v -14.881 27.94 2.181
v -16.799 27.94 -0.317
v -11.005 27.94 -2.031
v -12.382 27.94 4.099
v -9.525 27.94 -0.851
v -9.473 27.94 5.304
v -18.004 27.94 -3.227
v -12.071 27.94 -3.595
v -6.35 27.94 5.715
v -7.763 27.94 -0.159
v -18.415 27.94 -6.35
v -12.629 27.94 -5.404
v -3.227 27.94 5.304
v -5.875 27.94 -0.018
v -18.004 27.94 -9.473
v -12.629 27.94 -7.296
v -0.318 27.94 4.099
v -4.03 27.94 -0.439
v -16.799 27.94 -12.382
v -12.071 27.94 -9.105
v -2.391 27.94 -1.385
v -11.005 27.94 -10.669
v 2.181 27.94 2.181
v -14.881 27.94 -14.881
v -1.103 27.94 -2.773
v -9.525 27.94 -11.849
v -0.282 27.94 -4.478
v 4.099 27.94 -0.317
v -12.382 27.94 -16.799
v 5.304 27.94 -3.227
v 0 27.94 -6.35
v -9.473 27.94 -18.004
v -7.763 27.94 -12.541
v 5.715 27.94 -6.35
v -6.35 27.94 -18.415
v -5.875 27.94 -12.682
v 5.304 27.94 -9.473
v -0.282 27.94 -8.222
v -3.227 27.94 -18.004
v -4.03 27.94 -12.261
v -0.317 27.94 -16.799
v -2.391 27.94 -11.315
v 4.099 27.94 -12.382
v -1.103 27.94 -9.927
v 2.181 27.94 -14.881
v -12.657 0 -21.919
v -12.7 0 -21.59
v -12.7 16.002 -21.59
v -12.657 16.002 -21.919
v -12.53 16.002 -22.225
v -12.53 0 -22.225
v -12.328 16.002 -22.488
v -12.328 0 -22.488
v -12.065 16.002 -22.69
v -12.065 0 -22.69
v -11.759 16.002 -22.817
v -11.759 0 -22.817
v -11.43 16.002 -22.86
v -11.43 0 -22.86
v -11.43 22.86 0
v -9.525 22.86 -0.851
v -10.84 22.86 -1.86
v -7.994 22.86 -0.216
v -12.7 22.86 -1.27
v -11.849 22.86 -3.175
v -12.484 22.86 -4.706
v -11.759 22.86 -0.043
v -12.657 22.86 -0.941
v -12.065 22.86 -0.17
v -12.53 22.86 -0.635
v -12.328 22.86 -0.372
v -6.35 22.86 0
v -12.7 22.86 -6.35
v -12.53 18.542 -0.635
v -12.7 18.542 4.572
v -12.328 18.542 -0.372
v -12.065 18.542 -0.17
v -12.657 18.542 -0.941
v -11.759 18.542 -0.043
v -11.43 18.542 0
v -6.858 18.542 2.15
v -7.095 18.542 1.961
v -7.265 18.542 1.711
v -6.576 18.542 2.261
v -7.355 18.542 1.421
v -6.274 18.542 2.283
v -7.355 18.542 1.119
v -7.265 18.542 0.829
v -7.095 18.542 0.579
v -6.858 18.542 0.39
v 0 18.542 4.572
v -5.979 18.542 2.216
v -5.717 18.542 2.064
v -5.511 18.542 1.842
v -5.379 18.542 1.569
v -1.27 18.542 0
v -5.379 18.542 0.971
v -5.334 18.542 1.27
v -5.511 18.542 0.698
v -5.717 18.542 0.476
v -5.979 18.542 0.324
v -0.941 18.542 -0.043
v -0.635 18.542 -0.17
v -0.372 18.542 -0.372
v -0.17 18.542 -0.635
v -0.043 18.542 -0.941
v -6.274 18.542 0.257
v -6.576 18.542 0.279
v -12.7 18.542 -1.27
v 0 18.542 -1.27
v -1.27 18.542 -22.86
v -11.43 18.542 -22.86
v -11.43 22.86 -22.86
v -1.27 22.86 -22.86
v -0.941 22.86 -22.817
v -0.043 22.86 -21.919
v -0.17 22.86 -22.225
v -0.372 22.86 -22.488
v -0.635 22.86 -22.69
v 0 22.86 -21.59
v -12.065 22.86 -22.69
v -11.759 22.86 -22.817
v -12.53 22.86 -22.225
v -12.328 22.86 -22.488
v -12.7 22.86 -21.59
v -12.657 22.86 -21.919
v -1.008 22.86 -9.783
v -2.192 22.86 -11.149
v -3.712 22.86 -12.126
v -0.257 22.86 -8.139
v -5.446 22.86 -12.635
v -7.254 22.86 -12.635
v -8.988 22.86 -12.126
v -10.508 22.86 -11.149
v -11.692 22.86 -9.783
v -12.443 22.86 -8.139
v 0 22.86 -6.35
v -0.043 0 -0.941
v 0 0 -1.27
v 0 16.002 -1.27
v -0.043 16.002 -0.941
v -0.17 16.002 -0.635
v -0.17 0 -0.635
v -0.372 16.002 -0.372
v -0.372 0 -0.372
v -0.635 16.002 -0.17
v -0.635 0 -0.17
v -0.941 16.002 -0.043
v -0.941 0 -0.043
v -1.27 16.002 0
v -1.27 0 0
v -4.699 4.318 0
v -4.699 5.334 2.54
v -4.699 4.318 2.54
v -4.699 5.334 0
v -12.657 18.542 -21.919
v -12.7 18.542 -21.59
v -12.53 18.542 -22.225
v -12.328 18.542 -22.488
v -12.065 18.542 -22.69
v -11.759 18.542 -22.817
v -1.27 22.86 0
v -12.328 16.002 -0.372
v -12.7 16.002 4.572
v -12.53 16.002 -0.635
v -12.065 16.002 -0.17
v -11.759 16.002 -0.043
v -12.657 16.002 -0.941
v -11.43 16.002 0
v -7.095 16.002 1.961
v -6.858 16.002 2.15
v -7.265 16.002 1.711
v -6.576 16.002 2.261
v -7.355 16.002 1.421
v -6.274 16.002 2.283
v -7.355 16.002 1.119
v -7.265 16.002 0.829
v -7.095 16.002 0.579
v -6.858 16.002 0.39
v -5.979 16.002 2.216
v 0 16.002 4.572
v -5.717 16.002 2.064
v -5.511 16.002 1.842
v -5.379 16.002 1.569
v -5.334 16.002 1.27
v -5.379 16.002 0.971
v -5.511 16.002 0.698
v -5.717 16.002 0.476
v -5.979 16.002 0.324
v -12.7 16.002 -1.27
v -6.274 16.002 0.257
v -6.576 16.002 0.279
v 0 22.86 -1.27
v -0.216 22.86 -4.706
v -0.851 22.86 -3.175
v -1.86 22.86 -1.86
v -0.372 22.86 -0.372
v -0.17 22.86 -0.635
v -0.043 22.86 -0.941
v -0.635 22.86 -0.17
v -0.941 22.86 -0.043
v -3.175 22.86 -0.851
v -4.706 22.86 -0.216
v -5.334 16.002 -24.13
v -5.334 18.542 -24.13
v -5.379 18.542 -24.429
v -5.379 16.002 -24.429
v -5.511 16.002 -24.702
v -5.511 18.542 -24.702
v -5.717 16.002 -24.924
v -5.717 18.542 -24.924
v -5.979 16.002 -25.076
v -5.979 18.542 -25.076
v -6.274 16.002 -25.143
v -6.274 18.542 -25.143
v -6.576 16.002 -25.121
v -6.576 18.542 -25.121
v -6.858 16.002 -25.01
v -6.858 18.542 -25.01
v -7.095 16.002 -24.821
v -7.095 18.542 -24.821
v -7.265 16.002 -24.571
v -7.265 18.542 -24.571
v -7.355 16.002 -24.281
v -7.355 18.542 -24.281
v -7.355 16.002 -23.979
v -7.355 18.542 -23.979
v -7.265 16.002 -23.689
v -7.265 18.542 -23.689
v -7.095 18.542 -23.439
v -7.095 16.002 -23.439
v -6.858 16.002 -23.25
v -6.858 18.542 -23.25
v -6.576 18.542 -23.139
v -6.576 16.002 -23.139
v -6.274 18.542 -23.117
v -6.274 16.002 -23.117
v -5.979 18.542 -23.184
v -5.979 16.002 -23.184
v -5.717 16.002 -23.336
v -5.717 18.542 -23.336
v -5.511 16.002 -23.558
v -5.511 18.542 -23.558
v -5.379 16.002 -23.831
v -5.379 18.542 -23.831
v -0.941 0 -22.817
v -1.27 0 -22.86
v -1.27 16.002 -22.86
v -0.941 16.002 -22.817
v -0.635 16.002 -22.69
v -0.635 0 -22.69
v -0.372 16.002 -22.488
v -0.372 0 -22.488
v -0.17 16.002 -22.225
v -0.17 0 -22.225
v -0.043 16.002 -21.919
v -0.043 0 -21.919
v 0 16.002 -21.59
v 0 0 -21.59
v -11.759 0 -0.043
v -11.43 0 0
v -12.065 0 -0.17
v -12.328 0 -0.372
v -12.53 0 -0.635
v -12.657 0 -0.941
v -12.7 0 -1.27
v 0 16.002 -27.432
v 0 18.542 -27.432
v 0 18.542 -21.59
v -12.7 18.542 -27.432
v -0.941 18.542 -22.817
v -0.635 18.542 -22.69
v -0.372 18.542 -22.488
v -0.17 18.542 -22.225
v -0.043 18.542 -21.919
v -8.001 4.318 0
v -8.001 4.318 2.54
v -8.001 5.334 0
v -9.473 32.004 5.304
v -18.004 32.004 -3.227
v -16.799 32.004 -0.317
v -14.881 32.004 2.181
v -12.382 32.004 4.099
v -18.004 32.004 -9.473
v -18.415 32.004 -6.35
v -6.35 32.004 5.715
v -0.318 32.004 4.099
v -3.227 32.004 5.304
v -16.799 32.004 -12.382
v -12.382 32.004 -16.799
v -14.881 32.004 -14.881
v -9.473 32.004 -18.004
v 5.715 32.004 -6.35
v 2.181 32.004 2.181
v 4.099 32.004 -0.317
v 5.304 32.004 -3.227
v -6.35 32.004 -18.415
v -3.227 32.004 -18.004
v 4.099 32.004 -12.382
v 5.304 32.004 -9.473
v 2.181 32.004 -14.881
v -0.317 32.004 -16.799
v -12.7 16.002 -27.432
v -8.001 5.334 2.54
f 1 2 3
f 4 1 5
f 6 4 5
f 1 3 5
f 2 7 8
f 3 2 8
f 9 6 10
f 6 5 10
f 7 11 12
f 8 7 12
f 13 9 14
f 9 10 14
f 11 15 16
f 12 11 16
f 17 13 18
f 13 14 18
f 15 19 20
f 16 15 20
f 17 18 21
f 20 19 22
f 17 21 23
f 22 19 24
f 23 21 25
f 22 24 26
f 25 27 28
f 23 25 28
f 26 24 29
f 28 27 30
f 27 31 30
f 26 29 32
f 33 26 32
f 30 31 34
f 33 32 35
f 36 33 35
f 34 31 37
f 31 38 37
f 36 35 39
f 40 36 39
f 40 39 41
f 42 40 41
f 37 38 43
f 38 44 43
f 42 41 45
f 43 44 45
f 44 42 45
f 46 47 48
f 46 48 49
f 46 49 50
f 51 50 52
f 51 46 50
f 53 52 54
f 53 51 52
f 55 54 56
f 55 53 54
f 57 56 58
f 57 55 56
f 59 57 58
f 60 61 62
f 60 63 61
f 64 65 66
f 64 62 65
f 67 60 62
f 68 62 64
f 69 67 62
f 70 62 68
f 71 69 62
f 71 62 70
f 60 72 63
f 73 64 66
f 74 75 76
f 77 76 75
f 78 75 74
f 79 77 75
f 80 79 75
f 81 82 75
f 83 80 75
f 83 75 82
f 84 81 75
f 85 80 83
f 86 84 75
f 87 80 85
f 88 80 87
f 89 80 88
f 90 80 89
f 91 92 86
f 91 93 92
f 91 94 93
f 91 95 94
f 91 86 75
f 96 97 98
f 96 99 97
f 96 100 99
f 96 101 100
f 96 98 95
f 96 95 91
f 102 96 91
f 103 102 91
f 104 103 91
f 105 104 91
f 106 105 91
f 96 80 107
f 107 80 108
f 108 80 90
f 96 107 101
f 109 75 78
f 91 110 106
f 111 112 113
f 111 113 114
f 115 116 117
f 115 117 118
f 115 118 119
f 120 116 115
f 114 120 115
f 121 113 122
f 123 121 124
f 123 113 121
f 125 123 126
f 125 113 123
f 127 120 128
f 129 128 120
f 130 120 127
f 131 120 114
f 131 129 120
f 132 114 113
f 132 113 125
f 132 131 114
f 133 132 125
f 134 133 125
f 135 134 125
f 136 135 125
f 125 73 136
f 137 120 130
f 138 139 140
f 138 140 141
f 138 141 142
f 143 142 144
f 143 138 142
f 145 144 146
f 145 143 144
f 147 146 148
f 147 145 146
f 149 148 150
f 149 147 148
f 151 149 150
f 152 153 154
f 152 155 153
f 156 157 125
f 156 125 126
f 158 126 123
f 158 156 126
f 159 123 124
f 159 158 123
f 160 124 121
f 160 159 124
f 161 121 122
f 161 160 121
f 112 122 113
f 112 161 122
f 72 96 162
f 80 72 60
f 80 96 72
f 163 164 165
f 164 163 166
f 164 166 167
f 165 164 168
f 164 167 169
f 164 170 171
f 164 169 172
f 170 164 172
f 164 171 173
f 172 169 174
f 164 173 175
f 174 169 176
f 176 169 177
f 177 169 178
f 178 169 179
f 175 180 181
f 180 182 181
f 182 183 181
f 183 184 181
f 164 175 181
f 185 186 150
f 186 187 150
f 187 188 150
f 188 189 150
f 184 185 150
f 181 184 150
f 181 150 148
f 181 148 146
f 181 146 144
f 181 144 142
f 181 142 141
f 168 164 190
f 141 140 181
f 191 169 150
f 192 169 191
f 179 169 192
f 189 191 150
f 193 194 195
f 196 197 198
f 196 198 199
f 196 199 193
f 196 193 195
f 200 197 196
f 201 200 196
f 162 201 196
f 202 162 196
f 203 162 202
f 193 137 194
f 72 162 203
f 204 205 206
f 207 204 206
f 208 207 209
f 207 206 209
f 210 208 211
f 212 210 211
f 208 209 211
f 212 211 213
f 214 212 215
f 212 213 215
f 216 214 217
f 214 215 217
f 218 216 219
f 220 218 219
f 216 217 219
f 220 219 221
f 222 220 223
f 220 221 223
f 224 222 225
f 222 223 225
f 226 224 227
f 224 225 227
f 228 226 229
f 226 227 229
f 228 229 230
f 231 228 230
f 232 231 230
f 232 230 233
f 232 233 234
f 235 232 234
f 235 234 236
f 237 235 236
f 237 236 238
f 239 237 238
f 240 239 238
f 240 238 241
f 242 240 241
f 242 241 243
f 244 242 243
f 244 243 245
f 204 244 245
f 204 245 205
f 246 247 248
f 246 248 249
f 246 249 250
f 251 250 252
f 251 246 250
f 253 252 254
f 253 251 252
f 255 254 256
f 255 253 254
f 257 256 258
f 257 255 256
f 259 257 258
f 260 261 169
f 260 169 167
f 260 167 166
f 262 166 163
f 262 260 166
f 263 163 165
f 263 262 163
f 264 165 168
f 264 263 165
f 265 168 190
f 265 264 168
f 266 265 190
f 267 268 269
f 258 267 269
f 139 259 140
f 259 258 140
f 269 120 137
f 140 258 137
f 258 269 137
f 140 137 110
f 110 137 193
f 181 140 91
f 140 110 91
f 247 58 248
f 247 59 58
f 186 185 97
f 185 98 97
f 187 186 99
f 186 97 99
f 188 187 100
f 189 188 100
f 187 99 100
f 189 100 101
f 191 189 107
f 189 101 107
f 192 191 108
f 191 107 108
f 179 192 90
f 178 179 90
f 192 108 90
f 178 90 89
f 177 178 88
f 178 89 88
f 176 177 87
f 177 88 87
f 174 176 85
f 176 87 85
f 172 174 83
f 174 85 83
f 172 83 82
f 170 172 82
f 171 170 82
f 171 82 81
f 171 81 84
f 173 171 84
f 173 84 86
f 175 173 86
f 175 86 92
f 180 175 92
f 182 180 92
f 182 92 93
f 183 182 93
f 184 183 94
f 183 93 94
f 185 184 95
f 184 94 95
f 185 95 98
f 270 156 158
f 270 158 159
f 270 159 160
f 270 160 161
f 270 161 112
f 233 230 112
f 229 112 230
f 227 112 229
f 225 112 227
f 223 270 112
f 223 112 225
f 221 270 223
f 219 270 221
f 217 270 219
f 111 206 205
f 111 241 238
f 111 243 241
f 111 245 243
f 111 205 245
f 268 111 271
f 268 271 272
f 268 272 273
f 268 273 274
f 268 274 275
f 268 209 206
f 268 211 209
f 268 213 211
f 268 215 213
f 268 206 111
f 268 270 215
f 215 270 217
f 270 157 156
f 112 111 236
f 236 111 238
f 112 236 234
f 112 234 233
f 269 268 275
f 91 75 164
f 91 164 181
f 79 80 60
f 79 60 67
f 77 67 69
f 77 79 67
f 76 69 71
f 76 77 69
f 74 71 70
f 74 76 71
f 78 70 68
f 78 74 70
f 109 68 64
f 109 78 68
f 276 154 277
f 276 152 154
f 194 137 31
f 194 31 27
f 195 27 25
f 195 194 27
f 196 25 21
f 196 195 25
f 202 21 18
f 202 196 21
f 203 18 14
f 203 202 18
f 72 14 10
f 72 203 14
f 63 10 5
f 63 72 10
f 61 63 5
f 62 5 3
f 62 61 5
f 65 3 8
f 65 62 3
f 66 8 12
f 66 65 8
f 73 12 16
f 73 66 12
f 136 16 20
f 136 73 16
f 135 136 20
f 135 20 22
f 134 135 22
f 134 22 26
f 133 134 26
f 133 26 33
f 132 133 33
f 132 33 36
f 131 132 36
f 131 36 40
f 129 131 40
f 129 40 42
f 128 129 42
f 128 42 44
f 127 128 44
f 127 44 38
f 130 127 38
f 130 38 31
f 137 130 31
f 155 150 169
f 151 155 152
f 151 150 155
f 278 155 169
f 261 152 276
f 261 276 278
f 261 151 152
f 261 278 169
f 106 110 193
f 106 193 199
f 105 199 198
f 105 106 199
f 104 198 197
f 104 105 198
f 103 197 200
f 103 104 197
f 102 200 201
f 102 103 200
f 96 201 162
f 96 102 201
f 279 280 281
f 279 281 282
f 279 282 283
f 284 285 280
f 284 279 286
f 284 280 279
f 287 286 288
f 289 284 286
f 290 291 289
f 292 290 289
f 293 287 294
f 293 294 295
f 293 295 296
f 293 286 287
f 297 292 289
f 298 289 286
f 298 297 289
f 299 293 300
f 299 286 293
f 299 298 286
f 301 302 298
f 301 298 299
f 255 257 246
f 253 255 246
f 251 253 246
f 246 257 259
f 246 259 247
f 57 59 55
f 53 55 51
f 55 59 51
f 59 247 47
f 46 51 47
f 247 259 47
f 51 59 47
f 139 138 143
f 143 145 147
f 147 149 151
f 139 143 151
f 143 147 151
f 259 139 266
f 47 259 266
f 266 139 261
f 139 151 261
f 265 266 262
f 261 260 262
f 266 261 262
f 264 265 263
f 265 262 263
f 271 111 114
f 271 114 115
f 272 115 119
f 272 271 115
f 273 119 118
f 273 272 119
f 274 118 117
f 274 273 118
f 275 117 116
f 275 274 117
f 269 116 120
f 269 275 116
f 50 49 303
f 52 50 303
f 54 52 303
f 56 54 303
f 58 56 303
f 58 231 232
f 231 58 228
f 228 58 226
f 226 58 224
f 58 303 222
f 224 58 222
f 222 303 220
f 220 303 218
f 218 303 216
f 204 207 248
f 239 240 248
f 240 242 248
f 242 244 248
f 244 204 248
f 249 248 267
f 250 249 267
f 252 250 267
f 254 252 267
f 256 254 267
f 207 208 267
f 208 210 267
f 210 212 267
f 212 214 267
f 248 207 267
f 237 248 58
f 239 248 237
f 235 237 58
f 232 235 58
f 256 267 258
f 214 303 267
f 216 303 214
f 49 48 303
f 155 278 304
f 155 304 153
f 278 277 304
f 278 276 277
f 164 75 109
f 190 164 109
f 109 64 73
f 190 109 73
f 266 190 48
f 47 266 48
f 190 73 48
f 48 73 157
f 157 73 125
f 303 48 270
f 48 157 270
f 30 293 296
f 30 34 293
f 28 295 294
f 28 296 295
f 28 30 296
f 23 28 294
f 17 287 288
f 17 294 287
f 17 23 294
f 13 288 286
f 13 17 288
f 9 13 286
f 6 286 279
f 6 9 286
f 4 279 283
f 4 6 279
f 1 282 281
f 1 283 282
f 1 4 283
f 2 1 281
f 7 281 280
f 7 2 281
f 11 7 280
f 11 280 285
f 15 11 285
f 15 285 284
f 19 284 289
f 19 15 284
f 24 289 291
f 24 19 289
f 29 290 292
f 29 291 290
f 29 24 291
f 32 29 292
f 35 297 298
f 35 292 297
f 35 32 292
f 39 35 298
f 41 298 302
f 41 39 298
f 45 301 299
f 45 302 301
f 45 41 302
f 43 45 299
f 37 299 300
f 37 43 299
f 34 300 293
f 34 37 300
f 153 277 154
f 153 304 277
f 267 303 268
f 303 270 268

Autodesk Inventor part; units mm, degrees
ref_plane "YZ Plane" through (0, 0, 0) normal (1, 0, 0) x (0, 1, 0)
ref_plane "XZ Plane" through (0, 0, 0) normal (0, 1, 0) x (-1, 0, 0)
sketch "Sketch1" plane through (0, 0, 0) normal (0, 1, 0) x (-1, 0, 0)
  line L0 (1.27, 0) -> (11.43, 0)
  line L1 (12.7, -1.27) -> (12.7, -21.59)
  line L2 (11.43, -22.86) -> (1.27, -22.86)
  line L3 (0, -21.59) -> (0, -1.27)
  arc A0 (12.7, -1.27) -> (11.43, 0) centre (11.43, -1.27) ccw
  arc A1 (1.27, 0) -> (0, -1.27) centre (1.27, -1.27) ccw
  arc A2 (0, -21.59) -> (1.27, -22.86) centre (1.27, -21.59) ccw
  arc A3 (11.43, -22.86) -> (12.7, -21.59) centre (11.43, -21.59) ccw
  point P0 (0, 0)
  point P1 (12.7, -22.86)
  point P2 (12.7, 0)
  point P3 (0, -22.86)
  dimension "d0" = 12.7
  dimension "d1" = 22.86
  dimension "d2" = 1.27
extrude "Extrusion1" add sketch "Sketch1" along normal blind 22.86
sketch "Sketch2" plane through (0, 22.86, 0) normal (0, 1, 0) x (1, 0, 0)
  line L0 (-12.7, 21.59) -> (-12.7, 1.27) projected
  line L1 (-11.43, 0) -> (-1.27, 0) projected
  line L2 (0, 1.27) -> (0, 21.59) projected
  circle A0 centre (-6.35, 6.35) radius 6.35
  point P0 (0, 0)
extrude "Extrusion2" add sketch "Sketch2" along normal blind 5.08
sketch "Sketch3" plane through (-6.35, 27.94, -6.35) normal (0, 1, 0) x (1, 0, 0)
  circle A0 centre (0, 0) radius 12.065
  point P0 (6.35, -6.35)
  dimension "d9" = 24.13
extrude "Extrusion3" add sketch "Sketch3" along normal blind 4.064
ref_plane "Work Plane1" through (0, 18.542, 0) normal (0, 1, 0) x (1, 0, 0)
sketch "Sketch5" plane through (0, 18.542, 0) normal (0, 1, 0) x (1, 0, 0)
  line L0 (-12.7, 27.432) -> (0, 27.432)
  line L1 (-12.7, 21.59) -> (-12.7, 1.27) projected
  line L2 (0, 1.27) -> (0, 21.59) projected
  circle A0 centre (-6.35, 24.13) radius 1.016
  line L3 (0, 11.43) -> (-12.7, 11.43) construction
  line L4 (-12.7, -4.572) -> (0, -4.572)
  circle A1 centre (-6.35, -1.27) radius 1.016
  line L5 (-12.7, -4.572) -> (-12.7, 27.432)
  line L6 (0, 27.432) -> (0, -4.572)
  point P0 (0, 0)
  dimension "d13" = 16.002
  dimension "d14" = 2.032
  dimension "d15" = 25.4
extrude "Extrusion4" add sketch "Sketch5" against normal blind 2.54
sketch "Sketch6" plane through (-11.43, 0, 0) normal (0, 0, 1) x (1, 0, 0)
  line L0 (3.429, 5.334) -> (6.731, 5.334)
  line L1 (6.731, 5.334) -> (6.731, 4.318)
  line L2 (6.731, 4.318) -> (3.429, 4.318)
  line L3 (3.429, 4.318) -> (3.429, 5.334)
  line L4 (0, 0) -> (10.16, 0) projected
  point P0 (11.43, 0)
  point P1 (5.08, 0)
  point P2 (5.08, 4.318)
  dimension "d18" = 3.302
  dimension "d19" = 1.016
  dimension "d20" = 4.318
extrude "Extrusion5" add sketch "Sketch6" along normal blind 2.54
properties part number "servo (2)"
